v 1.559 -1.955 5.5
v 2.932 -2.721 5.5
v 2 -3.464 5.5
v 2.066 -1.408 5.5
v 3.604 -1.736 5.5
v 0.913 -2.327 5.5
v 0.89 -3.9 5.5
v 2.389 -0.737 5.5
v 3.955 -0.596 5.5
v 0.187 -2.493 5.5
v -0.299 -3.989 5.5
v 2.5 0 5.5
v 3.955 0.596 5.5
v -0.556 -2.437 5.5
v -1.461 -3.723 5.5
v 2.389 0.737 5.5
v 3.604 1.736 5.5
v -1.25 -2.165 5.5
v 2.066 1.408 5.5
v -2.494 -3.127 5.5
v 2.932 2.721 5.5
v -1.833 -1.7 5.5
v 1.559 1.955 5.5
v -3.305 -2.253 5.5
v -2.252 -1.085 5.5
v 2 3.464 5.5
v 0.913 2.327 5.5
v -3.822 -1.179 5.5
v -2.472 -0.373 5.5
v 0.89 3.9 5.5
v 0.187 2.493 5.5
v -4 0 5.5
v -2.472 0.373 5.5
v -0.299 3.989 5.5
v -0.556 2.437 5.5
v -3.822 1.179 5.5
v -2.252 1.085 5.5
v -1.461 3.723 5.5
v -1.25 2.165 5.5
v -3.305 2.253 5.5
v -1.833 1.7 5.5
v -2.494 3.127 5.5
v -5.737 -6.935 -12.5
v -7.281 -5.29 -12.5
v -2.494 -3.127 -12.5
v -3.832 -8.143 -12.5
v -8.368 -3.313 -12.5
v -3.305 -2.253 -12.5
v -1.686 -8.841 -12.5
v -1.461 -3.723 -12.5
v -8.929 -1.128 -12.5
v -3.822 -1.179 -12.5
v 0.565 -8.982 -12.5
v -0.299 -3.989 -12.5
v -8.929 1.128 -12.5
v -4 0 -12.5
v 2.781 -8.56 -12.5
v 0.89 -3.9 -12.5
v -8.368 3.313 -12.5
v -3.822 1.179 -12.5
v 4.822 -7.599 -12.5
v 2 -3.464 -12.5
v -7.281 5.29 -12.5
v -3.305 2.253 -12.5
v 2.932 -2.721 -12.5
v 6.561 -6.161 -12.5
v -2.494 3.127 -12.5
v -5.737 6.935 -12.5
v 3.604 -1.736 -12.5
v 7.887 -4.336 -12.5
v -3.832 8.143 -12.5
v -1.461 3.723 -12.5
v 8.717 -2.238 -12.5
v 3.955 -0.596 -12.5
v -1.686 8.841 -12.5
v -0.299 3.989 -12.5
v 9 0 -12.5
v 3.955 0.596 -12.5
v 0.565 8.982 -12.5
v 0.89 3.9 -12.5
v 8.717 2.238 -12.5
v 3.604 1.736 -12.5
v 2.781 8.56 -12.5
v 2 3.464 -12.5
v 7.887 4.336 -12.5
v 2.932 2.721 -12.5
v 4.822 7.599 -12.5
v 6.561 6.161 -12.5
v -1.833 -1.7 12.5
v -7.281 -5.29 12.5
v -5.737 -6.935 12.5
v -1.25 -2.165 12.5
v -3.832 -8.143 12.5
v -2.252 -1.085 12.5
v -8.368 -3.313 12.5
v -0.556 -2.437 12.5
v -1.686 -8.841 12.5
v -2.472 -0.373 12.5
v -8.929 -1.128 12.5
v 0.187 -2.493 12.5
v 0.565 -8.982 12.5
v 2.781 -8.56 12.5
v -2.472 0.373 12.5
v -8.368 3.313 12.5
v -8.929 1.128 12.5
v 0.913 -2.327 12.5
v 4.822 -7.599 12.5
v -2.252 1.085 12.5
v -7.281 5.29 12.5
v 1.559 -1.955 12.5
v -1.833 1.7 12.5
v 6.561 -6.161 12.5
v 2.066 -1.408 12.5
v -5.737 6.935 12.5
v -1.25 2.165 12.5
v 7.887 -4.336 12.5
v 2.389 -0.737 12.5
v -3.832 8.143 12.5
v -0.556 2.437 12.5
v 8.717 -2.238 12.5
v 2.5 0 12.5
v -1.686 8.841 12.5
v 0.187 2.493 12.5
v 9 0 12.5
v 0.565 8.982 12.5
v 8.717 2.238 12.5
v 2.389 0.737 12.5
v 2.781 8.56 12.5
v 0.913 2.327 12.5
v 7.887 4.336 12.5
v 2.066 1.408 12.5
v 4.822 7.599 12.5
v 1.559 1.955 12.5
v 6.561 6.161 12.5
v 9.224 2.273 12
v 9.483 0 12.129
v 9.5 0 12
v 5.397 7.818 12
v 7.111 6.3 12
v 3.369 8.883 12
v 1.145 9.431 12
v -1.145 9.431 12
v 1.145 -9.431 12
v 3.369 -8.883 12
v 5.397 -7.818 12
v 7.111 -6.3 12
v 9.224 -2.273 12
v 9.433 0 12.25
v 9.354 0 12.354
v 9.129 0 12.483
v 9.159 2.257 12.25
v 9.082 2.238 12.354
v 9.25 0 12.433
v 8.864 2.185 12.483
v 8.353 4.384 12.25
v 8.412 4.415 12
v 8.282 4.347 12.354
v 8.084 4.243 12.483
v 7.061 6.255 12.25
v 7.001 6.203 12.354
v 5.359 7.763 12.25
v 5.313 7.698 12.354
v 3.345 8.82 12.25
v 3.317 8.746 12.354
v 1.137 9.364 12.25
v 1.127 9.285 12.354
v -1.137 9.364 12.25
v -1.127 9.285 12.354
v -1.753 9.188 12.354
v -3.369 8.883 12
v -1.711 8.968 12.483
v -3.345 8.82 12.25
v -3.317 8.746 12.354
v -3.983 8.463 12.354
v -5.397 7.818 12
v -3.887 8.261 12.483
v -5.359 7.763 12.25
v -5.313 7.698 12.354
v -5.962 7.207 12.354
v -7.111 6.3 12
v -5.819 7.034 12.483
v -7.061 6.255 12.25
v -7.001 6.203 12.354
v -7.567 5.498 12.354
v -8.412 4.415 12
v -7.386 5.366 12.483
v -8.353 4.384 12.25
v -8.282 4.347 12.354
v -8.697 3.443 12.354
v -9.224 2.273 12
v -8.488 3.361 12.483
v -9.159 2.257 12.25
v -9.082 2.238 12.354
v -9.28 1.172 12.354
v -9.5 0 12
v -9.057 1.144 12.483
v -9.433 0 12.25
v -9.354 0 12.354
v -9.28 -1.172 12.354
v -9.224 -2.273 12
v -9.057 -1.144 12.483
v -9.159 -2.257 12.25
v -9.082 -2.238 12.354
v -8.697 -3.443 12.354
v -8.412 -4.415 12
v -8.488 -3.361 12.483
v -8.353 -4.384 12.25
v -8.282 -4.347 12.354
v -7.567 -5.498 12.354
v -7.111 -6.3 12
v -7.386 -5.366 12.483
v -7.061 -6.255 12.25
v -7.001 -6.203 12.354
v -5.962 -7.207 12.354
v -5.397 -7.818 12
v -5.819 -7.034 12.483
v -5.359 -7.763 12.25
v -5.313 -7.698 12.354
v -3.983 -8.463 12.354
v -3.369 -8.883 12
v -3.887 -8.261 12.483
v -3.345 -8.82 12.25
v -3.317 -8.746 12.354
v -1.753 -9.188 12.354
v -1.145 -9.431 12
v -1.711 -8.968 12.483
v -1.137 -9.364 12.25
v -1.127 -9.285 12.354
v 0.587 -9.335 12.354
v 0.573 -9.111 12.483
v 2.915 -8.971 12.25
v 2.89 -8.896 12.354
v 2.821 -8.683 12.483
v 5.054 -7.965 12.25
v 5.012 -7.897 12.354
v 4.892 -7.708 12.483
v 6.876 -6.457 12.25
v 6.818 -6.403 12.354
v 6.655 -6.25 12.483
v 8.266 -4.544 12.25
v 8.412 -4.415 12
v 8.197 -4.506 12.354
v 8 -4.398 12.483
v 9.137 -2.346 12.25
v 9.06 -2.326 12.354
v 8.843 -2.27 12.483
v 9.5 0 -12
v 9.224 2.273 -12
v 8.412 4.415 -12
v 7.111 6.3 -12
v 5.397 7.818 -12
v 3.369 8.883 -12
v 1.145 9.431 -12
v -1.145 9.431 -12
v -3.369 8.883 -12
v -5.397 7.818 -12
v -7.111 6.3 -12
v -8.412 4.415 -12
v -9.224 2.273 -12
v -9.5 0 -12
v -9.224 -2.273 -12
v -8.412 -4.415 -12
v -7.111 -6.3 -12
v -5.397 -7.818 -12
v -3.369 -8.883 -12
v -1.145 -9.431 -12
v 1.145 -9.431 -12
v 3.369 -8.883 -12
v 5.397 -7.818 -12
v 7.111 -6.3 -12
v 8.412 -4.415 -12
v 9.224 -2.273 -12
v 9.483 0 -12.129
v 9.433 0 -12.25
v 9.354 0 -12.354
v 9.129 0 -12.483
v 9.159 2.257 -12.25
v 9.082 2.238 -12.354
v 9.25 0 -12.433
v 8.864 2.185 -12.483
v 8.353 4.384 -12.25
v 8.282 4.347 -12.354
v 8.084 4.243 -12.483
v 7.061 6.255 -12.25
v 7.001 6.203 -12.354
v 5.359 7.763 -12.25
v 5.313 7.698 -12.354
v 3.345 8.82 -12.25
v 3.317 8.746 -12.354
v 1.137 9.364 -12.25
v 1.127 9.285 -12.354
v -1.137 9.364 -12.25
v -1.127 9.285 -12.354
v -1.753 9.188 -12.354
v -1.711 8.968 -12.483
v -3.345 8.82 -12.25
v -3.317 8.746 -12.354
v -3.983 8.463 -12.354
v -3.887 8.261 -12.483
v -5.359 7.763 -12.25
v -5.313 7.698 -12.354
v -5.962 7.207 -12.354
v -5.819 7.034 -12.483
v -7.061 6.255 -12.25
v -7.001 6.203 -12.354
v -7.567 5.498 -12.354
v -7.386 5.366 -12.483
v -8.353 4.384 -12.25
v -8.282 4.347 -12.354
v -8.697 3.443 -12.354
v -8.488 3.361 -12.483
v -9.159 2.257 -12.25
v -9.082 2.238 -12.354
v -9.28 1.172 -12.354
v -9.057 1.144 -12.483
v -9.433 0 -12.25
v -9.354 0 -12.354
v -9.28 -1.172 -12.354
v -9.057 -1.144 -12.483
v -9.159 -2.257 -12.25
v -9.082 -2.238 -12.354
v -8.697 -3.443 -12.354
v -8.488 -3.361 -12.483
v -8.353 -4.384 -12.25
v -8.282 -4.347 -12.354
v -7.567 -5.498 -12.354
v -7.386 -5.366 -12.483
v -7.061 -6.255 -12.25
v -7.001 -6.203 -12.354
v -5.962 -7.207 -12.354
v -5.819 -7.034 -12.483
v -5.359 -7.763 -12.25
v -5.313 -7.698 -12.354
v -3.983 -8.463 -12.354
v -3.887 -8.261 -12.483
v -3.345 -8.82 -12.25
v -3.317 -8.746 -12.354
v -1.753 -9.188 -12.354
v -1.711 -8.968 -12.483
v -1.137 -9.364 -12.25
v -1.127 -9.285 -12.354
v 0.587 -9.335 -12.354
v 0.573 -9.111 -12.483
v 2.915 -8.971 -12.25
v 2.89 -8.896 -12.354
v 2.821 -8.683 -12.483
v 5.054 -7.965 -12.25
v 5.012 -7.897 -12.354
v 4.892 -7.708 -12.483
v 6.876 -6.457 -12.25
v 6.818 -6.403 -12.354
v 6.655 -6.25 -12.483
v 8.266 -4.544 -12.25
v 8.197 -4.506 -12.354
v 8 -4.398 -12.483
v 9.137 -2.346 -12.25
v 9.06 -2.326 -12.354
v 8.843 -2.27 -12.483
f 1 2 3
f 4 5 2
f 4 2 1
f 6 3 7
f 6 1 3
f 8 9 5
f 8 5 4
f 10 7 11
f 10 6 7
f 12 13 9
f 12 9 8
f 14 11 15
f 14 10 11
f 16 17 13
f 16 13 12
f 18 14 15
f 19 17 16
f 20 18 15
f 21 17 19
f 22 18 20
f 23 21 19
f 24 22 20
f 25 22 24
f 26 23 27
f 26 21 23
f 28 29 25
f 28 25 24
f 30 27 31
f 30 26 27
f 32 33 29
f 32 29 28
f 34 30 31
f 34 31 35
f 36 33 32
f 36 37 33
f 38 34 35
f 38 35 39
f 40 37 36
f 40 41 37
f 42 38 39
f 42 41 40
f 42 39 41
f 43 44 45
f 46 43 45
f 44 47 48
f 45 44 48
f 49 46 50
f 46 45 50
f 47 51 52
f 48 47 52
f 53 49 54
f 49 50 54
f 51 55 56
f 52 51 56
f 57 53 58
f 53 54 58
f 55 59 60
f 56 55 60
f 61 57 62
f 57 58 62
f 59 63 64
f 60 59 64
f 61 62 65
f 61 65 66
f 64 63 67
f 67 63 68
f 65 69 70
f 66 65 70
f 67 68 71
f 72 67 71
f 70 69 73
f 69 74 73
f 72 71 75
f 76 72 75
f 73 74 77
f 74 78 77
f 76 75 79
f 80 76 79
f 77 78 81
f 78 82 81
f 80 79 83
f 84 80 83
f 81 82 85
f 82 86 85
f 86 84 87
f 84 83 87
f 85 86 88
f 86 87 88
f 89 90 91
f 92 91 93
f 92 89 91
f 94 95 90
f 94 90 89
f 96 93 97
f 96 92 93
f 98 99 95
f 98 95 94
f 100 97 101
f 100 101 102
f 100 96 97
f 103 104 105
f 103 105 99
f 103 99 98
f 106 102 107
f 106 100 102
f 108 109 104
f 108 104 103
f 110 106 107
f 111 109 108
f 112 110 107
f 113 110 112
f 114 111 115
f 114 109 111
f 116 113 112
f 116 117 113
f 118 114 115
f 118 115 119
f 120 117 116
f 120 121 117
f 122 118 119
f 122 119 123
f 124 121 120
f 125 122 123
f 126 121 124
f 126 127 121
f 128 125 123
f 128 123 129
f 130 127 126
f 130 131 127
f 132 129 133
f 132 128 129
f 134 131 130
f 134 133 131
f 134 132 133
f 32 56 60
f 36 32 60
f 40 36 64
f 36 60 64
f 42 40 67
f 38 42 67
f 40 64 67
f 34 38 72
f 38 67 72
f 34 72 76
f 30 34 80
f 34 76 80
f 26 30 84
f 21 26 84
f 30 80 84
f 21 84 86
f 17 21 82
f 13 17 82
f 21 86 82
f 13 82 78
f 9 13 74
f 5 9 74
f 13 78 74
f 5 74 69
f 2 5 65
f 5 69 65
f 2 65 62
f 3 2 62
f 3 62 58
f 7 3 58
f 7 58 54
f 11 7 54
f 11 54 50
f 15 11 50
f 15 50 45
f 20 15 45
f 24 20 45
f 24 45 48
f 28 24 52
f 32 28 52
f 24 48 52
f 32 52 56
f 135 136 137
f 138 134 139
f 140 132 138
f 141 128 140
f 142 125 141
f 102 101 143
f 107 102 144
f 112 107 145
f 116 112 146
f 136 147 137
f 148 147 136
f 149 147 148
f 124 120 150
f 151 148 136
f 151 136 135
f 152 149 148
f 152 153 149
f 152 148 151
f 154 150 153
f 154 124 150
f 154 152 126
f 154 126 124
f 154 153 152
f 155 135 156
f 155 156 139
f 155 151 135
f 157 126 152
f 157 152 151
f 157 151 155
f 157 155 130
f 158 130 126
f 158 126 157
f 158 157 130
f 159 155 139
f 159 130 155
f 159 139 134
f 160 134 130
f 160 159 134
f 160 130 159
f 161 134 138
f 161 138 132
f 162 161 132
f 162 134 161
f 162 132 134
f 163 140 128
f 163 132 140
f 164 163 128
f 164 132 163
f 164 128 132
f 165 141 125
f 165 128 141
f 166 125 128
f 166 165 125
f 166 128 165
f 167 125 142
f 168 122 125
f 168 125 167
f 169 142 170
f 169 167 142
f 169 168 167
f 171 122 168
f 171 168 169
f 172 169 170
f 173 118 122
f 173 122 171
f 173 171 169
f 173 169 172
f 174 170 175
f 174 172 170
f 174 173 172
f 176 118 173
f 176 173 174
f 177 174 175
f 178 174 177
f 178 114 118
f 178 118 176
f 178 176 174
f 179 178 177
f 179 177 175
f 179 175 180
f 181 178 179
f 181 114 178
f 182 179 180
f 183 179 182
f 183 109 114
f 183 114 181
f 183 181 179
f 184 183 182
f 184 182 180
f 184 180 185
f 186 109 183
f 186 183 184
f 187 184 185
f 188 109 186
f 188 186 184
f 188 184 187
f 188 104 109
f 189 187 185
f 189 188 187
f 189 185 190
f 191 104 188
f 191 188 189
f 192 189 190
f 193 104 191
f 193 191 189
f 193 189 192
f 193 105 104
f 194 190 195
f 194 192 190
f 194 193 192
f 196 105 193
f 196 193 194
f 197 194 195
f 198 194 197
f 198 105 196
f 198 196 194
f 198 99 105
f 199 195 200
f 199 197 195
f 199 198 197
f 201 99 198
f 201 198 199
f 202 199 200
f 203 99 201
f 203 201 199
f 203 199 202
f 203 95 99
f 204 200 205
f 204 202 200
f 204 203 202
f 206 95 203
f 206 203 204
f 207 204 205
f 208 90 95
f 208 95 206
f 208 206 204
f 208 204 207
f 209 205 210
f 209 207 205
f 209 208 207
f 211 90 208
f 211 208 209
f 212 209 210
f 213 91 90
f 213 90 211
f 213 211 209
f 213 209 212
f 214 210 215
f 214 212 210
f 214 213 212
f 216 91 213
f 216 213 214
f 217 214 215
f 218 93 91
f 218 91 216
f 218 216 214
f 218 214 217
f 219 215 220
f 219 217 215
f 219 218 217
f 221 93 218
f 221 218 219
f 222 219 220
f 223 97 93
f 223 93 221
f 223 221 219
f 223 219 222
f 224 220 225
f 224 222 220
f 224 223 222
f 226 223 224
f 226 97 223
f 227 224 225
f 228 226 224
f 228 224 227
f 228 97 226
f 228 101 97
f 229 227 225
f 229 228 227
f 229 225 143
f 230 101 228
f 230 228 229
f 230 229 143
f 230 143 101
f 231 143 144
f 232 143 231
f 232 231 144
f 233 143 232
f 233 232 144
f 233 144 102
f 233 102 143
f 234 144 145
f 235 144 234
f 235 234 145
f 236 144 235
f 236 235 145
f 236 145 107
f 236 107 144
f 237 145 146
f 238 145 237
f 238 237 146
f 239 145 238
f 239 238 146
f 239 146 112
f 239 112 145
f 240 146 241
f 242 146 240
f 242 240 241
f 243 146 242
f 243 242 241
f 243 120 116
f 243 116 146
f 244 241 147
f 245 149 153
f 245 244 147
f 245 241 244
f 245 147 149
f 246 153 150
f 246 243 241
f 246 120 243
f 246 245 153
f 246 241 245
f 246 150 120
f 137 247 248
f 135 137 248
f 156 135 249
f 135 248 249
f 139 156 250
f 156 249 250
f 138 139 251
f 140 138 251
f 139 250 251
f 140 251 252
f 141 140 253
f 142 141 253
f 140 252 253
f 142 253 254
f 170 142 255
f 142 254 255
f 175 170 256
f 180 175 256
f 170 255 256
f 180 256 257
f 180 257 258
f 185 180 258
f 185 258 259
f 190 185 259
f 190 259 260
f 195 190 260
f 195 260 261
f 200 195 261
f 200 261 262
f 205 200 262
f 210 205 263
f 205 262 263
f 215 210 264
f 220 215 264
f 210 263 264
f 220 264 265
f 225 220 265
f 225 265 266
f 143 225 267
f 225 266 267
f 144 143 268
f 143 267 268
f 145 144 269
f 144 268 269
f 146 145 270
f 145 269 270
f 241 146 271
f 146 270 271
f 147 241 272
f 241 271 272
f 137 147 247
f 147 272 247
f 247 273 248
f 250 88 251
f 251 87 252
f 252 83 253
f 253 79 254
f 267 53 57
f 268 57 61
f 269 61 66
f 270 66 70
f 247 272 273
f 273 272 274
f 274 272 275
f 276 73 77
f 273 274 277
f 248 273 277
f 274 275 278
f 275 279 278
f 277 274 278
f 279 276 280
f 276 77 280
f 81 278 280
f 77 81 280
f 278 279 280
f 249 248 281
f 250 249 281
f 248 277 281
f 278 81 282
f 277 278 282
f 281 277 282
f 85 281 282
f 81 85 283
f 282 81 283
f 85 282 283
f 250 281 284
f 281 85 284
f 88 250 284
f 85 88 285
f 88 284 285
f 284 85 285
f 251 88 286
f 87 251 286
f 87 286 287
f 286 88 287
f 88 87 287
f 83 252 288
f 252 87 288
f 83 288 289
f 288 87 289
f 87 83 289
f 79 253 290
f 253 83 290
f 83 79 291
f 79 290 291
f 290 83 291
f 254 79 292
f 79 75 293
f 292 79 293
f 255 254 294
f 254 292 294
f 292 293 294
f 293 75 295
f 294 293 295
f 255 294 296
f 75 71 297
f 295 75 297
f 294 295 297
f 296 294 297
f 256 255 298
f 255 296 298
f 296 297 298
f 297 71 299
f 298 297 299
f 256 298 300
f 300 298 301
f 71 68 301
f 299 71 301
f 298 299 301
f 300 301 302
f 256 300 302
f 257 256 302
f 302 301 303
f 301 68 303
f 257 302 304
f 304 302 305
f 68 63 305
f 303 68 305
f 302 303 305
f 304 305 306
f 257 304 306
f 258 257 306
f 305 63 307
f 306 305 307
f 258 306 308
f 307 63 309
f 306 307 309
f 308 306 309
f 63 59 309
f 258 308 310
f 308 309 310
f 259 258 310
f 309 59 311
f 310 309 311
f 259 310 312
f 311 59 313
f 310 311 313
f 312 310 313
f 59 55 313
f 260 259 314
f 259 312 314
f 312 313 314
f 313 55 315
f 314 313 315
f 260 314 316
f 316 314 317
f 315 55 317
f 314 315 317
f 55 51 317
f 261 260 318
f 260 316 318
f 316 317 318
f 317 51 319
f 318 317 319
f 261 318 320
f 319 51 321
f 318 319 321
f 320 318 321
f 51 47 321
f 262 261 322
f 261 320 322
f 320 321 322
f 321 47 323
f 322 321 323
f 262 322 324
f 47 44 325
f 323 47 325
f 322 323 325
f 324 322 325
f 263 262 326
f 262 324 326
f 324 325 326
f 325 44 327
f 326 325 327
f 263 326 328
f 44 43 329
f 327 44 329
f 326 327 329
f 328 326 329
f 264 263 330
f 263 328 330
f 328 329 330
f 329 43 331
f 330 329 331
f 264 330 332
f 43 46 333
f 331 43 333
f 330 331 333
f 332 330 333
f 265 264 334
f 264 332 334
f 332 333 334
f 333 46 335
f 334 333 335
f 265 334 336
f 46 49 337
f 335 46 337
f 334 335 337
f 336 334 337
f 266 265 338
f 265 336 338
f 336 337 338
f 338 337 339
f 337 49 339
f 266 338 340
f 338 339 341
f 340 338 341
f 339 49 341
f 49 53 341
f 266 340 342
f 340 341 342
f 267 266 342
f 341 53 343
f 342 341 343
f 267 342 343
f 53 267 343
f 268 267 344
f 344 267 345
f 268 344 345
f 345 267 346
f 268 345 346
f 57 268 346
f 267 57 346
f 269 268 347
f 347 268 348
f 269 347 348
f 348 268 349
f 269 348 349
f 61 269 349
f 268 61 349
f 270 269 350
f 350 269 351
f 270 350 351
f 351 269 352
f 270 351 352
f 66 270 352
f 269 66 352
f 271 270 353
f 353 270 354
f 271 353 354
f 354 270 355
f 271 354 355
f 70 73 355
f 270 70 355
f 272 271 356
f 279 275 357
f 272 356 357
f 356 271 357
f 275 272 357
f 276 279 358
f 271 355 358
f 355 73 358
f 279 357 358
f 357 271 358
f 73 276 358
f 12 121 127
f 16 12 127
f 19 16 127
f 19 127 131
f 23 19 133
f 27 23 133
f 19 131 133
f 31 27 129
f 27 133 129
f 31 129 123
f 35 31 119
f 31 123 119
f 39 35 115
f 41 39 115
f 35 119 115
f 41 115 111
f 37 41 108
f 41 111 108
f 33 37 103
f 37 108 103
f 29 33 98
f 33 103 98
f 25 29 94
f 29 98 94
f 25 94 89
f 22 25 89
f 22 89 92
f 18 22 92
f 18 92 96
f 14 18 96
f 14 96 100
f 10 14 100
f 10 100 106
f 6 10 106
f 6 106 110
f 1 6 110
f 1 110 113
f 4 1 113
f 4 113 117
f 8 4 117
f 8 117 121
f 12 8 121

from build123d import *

# Parameters (mm, degrees)
EXTRUDE_1_DEPTH      = 12.5
EXTRUDE_1_DEPTH_BACK = 12.5
SKETCH_1_R           = 9.5
SKETCH_2_R           = 2.5
CUT_EXTRUDE_1_DEPTH  = 8
SKETCH_3_R           = 4
CUT_EXTRUDE_2_DEPTH  = 18
FILLET_1_R           = 0.5
FILLET_2_R           = 0.5


with BuildPart() as part:
    # 草图1 → 凸台-拉伸1 (new, two sides: drawn at the far end of the back side and taken through both)
    with BuildSketch(Plane.XY.offset(-EXTRUDE_1_DEPTH_BACK)):
        Circle(SKETCH_1_R)
    extrude(amount=EXTRUDE_1_DEPTH + EXTRUDE_1_DEPTH_BACK)

    # 草图2 → 切除-拉伸1 (cut)
    with BuildSketch(Plane.XY.offset(12.5)):
        Circle(SKETCH_2_R)
    extrude(amount=-CUT_EXTRUDE_1_DEPTH, mode=Mode.SUBTRACT)

    # 草图3 → 切除-拉伸2 (cut)
    with BuildSketch(Plane(origin=(0, 0, -12.5), x_dir=(-1, 0, 0), z_dir=(0, 0, -1))):
        Circle(SKETCH_3_R)
    extrude(amount=-CUT_EXTRUDE_2_DEPTH, mode=Mode.SUBTRACT)

    # 圆角1
    fillet_1_edges = [part.edges().sort_by_distance(p)[0] for p in [
        (-9.5, 0, -12.5),
    ]]
    fillet(fillet_1_edges, radius=FILLET_1_R)

    # 圆角2
    fillet_2_edges = [part.edges().sort_by_distance(p)[0] for p in [
        (-9.5, 0, 12.5),
    ]]
    fillet(fillet_2_edges, radius=FILLET_2_R)


solid = part.part
